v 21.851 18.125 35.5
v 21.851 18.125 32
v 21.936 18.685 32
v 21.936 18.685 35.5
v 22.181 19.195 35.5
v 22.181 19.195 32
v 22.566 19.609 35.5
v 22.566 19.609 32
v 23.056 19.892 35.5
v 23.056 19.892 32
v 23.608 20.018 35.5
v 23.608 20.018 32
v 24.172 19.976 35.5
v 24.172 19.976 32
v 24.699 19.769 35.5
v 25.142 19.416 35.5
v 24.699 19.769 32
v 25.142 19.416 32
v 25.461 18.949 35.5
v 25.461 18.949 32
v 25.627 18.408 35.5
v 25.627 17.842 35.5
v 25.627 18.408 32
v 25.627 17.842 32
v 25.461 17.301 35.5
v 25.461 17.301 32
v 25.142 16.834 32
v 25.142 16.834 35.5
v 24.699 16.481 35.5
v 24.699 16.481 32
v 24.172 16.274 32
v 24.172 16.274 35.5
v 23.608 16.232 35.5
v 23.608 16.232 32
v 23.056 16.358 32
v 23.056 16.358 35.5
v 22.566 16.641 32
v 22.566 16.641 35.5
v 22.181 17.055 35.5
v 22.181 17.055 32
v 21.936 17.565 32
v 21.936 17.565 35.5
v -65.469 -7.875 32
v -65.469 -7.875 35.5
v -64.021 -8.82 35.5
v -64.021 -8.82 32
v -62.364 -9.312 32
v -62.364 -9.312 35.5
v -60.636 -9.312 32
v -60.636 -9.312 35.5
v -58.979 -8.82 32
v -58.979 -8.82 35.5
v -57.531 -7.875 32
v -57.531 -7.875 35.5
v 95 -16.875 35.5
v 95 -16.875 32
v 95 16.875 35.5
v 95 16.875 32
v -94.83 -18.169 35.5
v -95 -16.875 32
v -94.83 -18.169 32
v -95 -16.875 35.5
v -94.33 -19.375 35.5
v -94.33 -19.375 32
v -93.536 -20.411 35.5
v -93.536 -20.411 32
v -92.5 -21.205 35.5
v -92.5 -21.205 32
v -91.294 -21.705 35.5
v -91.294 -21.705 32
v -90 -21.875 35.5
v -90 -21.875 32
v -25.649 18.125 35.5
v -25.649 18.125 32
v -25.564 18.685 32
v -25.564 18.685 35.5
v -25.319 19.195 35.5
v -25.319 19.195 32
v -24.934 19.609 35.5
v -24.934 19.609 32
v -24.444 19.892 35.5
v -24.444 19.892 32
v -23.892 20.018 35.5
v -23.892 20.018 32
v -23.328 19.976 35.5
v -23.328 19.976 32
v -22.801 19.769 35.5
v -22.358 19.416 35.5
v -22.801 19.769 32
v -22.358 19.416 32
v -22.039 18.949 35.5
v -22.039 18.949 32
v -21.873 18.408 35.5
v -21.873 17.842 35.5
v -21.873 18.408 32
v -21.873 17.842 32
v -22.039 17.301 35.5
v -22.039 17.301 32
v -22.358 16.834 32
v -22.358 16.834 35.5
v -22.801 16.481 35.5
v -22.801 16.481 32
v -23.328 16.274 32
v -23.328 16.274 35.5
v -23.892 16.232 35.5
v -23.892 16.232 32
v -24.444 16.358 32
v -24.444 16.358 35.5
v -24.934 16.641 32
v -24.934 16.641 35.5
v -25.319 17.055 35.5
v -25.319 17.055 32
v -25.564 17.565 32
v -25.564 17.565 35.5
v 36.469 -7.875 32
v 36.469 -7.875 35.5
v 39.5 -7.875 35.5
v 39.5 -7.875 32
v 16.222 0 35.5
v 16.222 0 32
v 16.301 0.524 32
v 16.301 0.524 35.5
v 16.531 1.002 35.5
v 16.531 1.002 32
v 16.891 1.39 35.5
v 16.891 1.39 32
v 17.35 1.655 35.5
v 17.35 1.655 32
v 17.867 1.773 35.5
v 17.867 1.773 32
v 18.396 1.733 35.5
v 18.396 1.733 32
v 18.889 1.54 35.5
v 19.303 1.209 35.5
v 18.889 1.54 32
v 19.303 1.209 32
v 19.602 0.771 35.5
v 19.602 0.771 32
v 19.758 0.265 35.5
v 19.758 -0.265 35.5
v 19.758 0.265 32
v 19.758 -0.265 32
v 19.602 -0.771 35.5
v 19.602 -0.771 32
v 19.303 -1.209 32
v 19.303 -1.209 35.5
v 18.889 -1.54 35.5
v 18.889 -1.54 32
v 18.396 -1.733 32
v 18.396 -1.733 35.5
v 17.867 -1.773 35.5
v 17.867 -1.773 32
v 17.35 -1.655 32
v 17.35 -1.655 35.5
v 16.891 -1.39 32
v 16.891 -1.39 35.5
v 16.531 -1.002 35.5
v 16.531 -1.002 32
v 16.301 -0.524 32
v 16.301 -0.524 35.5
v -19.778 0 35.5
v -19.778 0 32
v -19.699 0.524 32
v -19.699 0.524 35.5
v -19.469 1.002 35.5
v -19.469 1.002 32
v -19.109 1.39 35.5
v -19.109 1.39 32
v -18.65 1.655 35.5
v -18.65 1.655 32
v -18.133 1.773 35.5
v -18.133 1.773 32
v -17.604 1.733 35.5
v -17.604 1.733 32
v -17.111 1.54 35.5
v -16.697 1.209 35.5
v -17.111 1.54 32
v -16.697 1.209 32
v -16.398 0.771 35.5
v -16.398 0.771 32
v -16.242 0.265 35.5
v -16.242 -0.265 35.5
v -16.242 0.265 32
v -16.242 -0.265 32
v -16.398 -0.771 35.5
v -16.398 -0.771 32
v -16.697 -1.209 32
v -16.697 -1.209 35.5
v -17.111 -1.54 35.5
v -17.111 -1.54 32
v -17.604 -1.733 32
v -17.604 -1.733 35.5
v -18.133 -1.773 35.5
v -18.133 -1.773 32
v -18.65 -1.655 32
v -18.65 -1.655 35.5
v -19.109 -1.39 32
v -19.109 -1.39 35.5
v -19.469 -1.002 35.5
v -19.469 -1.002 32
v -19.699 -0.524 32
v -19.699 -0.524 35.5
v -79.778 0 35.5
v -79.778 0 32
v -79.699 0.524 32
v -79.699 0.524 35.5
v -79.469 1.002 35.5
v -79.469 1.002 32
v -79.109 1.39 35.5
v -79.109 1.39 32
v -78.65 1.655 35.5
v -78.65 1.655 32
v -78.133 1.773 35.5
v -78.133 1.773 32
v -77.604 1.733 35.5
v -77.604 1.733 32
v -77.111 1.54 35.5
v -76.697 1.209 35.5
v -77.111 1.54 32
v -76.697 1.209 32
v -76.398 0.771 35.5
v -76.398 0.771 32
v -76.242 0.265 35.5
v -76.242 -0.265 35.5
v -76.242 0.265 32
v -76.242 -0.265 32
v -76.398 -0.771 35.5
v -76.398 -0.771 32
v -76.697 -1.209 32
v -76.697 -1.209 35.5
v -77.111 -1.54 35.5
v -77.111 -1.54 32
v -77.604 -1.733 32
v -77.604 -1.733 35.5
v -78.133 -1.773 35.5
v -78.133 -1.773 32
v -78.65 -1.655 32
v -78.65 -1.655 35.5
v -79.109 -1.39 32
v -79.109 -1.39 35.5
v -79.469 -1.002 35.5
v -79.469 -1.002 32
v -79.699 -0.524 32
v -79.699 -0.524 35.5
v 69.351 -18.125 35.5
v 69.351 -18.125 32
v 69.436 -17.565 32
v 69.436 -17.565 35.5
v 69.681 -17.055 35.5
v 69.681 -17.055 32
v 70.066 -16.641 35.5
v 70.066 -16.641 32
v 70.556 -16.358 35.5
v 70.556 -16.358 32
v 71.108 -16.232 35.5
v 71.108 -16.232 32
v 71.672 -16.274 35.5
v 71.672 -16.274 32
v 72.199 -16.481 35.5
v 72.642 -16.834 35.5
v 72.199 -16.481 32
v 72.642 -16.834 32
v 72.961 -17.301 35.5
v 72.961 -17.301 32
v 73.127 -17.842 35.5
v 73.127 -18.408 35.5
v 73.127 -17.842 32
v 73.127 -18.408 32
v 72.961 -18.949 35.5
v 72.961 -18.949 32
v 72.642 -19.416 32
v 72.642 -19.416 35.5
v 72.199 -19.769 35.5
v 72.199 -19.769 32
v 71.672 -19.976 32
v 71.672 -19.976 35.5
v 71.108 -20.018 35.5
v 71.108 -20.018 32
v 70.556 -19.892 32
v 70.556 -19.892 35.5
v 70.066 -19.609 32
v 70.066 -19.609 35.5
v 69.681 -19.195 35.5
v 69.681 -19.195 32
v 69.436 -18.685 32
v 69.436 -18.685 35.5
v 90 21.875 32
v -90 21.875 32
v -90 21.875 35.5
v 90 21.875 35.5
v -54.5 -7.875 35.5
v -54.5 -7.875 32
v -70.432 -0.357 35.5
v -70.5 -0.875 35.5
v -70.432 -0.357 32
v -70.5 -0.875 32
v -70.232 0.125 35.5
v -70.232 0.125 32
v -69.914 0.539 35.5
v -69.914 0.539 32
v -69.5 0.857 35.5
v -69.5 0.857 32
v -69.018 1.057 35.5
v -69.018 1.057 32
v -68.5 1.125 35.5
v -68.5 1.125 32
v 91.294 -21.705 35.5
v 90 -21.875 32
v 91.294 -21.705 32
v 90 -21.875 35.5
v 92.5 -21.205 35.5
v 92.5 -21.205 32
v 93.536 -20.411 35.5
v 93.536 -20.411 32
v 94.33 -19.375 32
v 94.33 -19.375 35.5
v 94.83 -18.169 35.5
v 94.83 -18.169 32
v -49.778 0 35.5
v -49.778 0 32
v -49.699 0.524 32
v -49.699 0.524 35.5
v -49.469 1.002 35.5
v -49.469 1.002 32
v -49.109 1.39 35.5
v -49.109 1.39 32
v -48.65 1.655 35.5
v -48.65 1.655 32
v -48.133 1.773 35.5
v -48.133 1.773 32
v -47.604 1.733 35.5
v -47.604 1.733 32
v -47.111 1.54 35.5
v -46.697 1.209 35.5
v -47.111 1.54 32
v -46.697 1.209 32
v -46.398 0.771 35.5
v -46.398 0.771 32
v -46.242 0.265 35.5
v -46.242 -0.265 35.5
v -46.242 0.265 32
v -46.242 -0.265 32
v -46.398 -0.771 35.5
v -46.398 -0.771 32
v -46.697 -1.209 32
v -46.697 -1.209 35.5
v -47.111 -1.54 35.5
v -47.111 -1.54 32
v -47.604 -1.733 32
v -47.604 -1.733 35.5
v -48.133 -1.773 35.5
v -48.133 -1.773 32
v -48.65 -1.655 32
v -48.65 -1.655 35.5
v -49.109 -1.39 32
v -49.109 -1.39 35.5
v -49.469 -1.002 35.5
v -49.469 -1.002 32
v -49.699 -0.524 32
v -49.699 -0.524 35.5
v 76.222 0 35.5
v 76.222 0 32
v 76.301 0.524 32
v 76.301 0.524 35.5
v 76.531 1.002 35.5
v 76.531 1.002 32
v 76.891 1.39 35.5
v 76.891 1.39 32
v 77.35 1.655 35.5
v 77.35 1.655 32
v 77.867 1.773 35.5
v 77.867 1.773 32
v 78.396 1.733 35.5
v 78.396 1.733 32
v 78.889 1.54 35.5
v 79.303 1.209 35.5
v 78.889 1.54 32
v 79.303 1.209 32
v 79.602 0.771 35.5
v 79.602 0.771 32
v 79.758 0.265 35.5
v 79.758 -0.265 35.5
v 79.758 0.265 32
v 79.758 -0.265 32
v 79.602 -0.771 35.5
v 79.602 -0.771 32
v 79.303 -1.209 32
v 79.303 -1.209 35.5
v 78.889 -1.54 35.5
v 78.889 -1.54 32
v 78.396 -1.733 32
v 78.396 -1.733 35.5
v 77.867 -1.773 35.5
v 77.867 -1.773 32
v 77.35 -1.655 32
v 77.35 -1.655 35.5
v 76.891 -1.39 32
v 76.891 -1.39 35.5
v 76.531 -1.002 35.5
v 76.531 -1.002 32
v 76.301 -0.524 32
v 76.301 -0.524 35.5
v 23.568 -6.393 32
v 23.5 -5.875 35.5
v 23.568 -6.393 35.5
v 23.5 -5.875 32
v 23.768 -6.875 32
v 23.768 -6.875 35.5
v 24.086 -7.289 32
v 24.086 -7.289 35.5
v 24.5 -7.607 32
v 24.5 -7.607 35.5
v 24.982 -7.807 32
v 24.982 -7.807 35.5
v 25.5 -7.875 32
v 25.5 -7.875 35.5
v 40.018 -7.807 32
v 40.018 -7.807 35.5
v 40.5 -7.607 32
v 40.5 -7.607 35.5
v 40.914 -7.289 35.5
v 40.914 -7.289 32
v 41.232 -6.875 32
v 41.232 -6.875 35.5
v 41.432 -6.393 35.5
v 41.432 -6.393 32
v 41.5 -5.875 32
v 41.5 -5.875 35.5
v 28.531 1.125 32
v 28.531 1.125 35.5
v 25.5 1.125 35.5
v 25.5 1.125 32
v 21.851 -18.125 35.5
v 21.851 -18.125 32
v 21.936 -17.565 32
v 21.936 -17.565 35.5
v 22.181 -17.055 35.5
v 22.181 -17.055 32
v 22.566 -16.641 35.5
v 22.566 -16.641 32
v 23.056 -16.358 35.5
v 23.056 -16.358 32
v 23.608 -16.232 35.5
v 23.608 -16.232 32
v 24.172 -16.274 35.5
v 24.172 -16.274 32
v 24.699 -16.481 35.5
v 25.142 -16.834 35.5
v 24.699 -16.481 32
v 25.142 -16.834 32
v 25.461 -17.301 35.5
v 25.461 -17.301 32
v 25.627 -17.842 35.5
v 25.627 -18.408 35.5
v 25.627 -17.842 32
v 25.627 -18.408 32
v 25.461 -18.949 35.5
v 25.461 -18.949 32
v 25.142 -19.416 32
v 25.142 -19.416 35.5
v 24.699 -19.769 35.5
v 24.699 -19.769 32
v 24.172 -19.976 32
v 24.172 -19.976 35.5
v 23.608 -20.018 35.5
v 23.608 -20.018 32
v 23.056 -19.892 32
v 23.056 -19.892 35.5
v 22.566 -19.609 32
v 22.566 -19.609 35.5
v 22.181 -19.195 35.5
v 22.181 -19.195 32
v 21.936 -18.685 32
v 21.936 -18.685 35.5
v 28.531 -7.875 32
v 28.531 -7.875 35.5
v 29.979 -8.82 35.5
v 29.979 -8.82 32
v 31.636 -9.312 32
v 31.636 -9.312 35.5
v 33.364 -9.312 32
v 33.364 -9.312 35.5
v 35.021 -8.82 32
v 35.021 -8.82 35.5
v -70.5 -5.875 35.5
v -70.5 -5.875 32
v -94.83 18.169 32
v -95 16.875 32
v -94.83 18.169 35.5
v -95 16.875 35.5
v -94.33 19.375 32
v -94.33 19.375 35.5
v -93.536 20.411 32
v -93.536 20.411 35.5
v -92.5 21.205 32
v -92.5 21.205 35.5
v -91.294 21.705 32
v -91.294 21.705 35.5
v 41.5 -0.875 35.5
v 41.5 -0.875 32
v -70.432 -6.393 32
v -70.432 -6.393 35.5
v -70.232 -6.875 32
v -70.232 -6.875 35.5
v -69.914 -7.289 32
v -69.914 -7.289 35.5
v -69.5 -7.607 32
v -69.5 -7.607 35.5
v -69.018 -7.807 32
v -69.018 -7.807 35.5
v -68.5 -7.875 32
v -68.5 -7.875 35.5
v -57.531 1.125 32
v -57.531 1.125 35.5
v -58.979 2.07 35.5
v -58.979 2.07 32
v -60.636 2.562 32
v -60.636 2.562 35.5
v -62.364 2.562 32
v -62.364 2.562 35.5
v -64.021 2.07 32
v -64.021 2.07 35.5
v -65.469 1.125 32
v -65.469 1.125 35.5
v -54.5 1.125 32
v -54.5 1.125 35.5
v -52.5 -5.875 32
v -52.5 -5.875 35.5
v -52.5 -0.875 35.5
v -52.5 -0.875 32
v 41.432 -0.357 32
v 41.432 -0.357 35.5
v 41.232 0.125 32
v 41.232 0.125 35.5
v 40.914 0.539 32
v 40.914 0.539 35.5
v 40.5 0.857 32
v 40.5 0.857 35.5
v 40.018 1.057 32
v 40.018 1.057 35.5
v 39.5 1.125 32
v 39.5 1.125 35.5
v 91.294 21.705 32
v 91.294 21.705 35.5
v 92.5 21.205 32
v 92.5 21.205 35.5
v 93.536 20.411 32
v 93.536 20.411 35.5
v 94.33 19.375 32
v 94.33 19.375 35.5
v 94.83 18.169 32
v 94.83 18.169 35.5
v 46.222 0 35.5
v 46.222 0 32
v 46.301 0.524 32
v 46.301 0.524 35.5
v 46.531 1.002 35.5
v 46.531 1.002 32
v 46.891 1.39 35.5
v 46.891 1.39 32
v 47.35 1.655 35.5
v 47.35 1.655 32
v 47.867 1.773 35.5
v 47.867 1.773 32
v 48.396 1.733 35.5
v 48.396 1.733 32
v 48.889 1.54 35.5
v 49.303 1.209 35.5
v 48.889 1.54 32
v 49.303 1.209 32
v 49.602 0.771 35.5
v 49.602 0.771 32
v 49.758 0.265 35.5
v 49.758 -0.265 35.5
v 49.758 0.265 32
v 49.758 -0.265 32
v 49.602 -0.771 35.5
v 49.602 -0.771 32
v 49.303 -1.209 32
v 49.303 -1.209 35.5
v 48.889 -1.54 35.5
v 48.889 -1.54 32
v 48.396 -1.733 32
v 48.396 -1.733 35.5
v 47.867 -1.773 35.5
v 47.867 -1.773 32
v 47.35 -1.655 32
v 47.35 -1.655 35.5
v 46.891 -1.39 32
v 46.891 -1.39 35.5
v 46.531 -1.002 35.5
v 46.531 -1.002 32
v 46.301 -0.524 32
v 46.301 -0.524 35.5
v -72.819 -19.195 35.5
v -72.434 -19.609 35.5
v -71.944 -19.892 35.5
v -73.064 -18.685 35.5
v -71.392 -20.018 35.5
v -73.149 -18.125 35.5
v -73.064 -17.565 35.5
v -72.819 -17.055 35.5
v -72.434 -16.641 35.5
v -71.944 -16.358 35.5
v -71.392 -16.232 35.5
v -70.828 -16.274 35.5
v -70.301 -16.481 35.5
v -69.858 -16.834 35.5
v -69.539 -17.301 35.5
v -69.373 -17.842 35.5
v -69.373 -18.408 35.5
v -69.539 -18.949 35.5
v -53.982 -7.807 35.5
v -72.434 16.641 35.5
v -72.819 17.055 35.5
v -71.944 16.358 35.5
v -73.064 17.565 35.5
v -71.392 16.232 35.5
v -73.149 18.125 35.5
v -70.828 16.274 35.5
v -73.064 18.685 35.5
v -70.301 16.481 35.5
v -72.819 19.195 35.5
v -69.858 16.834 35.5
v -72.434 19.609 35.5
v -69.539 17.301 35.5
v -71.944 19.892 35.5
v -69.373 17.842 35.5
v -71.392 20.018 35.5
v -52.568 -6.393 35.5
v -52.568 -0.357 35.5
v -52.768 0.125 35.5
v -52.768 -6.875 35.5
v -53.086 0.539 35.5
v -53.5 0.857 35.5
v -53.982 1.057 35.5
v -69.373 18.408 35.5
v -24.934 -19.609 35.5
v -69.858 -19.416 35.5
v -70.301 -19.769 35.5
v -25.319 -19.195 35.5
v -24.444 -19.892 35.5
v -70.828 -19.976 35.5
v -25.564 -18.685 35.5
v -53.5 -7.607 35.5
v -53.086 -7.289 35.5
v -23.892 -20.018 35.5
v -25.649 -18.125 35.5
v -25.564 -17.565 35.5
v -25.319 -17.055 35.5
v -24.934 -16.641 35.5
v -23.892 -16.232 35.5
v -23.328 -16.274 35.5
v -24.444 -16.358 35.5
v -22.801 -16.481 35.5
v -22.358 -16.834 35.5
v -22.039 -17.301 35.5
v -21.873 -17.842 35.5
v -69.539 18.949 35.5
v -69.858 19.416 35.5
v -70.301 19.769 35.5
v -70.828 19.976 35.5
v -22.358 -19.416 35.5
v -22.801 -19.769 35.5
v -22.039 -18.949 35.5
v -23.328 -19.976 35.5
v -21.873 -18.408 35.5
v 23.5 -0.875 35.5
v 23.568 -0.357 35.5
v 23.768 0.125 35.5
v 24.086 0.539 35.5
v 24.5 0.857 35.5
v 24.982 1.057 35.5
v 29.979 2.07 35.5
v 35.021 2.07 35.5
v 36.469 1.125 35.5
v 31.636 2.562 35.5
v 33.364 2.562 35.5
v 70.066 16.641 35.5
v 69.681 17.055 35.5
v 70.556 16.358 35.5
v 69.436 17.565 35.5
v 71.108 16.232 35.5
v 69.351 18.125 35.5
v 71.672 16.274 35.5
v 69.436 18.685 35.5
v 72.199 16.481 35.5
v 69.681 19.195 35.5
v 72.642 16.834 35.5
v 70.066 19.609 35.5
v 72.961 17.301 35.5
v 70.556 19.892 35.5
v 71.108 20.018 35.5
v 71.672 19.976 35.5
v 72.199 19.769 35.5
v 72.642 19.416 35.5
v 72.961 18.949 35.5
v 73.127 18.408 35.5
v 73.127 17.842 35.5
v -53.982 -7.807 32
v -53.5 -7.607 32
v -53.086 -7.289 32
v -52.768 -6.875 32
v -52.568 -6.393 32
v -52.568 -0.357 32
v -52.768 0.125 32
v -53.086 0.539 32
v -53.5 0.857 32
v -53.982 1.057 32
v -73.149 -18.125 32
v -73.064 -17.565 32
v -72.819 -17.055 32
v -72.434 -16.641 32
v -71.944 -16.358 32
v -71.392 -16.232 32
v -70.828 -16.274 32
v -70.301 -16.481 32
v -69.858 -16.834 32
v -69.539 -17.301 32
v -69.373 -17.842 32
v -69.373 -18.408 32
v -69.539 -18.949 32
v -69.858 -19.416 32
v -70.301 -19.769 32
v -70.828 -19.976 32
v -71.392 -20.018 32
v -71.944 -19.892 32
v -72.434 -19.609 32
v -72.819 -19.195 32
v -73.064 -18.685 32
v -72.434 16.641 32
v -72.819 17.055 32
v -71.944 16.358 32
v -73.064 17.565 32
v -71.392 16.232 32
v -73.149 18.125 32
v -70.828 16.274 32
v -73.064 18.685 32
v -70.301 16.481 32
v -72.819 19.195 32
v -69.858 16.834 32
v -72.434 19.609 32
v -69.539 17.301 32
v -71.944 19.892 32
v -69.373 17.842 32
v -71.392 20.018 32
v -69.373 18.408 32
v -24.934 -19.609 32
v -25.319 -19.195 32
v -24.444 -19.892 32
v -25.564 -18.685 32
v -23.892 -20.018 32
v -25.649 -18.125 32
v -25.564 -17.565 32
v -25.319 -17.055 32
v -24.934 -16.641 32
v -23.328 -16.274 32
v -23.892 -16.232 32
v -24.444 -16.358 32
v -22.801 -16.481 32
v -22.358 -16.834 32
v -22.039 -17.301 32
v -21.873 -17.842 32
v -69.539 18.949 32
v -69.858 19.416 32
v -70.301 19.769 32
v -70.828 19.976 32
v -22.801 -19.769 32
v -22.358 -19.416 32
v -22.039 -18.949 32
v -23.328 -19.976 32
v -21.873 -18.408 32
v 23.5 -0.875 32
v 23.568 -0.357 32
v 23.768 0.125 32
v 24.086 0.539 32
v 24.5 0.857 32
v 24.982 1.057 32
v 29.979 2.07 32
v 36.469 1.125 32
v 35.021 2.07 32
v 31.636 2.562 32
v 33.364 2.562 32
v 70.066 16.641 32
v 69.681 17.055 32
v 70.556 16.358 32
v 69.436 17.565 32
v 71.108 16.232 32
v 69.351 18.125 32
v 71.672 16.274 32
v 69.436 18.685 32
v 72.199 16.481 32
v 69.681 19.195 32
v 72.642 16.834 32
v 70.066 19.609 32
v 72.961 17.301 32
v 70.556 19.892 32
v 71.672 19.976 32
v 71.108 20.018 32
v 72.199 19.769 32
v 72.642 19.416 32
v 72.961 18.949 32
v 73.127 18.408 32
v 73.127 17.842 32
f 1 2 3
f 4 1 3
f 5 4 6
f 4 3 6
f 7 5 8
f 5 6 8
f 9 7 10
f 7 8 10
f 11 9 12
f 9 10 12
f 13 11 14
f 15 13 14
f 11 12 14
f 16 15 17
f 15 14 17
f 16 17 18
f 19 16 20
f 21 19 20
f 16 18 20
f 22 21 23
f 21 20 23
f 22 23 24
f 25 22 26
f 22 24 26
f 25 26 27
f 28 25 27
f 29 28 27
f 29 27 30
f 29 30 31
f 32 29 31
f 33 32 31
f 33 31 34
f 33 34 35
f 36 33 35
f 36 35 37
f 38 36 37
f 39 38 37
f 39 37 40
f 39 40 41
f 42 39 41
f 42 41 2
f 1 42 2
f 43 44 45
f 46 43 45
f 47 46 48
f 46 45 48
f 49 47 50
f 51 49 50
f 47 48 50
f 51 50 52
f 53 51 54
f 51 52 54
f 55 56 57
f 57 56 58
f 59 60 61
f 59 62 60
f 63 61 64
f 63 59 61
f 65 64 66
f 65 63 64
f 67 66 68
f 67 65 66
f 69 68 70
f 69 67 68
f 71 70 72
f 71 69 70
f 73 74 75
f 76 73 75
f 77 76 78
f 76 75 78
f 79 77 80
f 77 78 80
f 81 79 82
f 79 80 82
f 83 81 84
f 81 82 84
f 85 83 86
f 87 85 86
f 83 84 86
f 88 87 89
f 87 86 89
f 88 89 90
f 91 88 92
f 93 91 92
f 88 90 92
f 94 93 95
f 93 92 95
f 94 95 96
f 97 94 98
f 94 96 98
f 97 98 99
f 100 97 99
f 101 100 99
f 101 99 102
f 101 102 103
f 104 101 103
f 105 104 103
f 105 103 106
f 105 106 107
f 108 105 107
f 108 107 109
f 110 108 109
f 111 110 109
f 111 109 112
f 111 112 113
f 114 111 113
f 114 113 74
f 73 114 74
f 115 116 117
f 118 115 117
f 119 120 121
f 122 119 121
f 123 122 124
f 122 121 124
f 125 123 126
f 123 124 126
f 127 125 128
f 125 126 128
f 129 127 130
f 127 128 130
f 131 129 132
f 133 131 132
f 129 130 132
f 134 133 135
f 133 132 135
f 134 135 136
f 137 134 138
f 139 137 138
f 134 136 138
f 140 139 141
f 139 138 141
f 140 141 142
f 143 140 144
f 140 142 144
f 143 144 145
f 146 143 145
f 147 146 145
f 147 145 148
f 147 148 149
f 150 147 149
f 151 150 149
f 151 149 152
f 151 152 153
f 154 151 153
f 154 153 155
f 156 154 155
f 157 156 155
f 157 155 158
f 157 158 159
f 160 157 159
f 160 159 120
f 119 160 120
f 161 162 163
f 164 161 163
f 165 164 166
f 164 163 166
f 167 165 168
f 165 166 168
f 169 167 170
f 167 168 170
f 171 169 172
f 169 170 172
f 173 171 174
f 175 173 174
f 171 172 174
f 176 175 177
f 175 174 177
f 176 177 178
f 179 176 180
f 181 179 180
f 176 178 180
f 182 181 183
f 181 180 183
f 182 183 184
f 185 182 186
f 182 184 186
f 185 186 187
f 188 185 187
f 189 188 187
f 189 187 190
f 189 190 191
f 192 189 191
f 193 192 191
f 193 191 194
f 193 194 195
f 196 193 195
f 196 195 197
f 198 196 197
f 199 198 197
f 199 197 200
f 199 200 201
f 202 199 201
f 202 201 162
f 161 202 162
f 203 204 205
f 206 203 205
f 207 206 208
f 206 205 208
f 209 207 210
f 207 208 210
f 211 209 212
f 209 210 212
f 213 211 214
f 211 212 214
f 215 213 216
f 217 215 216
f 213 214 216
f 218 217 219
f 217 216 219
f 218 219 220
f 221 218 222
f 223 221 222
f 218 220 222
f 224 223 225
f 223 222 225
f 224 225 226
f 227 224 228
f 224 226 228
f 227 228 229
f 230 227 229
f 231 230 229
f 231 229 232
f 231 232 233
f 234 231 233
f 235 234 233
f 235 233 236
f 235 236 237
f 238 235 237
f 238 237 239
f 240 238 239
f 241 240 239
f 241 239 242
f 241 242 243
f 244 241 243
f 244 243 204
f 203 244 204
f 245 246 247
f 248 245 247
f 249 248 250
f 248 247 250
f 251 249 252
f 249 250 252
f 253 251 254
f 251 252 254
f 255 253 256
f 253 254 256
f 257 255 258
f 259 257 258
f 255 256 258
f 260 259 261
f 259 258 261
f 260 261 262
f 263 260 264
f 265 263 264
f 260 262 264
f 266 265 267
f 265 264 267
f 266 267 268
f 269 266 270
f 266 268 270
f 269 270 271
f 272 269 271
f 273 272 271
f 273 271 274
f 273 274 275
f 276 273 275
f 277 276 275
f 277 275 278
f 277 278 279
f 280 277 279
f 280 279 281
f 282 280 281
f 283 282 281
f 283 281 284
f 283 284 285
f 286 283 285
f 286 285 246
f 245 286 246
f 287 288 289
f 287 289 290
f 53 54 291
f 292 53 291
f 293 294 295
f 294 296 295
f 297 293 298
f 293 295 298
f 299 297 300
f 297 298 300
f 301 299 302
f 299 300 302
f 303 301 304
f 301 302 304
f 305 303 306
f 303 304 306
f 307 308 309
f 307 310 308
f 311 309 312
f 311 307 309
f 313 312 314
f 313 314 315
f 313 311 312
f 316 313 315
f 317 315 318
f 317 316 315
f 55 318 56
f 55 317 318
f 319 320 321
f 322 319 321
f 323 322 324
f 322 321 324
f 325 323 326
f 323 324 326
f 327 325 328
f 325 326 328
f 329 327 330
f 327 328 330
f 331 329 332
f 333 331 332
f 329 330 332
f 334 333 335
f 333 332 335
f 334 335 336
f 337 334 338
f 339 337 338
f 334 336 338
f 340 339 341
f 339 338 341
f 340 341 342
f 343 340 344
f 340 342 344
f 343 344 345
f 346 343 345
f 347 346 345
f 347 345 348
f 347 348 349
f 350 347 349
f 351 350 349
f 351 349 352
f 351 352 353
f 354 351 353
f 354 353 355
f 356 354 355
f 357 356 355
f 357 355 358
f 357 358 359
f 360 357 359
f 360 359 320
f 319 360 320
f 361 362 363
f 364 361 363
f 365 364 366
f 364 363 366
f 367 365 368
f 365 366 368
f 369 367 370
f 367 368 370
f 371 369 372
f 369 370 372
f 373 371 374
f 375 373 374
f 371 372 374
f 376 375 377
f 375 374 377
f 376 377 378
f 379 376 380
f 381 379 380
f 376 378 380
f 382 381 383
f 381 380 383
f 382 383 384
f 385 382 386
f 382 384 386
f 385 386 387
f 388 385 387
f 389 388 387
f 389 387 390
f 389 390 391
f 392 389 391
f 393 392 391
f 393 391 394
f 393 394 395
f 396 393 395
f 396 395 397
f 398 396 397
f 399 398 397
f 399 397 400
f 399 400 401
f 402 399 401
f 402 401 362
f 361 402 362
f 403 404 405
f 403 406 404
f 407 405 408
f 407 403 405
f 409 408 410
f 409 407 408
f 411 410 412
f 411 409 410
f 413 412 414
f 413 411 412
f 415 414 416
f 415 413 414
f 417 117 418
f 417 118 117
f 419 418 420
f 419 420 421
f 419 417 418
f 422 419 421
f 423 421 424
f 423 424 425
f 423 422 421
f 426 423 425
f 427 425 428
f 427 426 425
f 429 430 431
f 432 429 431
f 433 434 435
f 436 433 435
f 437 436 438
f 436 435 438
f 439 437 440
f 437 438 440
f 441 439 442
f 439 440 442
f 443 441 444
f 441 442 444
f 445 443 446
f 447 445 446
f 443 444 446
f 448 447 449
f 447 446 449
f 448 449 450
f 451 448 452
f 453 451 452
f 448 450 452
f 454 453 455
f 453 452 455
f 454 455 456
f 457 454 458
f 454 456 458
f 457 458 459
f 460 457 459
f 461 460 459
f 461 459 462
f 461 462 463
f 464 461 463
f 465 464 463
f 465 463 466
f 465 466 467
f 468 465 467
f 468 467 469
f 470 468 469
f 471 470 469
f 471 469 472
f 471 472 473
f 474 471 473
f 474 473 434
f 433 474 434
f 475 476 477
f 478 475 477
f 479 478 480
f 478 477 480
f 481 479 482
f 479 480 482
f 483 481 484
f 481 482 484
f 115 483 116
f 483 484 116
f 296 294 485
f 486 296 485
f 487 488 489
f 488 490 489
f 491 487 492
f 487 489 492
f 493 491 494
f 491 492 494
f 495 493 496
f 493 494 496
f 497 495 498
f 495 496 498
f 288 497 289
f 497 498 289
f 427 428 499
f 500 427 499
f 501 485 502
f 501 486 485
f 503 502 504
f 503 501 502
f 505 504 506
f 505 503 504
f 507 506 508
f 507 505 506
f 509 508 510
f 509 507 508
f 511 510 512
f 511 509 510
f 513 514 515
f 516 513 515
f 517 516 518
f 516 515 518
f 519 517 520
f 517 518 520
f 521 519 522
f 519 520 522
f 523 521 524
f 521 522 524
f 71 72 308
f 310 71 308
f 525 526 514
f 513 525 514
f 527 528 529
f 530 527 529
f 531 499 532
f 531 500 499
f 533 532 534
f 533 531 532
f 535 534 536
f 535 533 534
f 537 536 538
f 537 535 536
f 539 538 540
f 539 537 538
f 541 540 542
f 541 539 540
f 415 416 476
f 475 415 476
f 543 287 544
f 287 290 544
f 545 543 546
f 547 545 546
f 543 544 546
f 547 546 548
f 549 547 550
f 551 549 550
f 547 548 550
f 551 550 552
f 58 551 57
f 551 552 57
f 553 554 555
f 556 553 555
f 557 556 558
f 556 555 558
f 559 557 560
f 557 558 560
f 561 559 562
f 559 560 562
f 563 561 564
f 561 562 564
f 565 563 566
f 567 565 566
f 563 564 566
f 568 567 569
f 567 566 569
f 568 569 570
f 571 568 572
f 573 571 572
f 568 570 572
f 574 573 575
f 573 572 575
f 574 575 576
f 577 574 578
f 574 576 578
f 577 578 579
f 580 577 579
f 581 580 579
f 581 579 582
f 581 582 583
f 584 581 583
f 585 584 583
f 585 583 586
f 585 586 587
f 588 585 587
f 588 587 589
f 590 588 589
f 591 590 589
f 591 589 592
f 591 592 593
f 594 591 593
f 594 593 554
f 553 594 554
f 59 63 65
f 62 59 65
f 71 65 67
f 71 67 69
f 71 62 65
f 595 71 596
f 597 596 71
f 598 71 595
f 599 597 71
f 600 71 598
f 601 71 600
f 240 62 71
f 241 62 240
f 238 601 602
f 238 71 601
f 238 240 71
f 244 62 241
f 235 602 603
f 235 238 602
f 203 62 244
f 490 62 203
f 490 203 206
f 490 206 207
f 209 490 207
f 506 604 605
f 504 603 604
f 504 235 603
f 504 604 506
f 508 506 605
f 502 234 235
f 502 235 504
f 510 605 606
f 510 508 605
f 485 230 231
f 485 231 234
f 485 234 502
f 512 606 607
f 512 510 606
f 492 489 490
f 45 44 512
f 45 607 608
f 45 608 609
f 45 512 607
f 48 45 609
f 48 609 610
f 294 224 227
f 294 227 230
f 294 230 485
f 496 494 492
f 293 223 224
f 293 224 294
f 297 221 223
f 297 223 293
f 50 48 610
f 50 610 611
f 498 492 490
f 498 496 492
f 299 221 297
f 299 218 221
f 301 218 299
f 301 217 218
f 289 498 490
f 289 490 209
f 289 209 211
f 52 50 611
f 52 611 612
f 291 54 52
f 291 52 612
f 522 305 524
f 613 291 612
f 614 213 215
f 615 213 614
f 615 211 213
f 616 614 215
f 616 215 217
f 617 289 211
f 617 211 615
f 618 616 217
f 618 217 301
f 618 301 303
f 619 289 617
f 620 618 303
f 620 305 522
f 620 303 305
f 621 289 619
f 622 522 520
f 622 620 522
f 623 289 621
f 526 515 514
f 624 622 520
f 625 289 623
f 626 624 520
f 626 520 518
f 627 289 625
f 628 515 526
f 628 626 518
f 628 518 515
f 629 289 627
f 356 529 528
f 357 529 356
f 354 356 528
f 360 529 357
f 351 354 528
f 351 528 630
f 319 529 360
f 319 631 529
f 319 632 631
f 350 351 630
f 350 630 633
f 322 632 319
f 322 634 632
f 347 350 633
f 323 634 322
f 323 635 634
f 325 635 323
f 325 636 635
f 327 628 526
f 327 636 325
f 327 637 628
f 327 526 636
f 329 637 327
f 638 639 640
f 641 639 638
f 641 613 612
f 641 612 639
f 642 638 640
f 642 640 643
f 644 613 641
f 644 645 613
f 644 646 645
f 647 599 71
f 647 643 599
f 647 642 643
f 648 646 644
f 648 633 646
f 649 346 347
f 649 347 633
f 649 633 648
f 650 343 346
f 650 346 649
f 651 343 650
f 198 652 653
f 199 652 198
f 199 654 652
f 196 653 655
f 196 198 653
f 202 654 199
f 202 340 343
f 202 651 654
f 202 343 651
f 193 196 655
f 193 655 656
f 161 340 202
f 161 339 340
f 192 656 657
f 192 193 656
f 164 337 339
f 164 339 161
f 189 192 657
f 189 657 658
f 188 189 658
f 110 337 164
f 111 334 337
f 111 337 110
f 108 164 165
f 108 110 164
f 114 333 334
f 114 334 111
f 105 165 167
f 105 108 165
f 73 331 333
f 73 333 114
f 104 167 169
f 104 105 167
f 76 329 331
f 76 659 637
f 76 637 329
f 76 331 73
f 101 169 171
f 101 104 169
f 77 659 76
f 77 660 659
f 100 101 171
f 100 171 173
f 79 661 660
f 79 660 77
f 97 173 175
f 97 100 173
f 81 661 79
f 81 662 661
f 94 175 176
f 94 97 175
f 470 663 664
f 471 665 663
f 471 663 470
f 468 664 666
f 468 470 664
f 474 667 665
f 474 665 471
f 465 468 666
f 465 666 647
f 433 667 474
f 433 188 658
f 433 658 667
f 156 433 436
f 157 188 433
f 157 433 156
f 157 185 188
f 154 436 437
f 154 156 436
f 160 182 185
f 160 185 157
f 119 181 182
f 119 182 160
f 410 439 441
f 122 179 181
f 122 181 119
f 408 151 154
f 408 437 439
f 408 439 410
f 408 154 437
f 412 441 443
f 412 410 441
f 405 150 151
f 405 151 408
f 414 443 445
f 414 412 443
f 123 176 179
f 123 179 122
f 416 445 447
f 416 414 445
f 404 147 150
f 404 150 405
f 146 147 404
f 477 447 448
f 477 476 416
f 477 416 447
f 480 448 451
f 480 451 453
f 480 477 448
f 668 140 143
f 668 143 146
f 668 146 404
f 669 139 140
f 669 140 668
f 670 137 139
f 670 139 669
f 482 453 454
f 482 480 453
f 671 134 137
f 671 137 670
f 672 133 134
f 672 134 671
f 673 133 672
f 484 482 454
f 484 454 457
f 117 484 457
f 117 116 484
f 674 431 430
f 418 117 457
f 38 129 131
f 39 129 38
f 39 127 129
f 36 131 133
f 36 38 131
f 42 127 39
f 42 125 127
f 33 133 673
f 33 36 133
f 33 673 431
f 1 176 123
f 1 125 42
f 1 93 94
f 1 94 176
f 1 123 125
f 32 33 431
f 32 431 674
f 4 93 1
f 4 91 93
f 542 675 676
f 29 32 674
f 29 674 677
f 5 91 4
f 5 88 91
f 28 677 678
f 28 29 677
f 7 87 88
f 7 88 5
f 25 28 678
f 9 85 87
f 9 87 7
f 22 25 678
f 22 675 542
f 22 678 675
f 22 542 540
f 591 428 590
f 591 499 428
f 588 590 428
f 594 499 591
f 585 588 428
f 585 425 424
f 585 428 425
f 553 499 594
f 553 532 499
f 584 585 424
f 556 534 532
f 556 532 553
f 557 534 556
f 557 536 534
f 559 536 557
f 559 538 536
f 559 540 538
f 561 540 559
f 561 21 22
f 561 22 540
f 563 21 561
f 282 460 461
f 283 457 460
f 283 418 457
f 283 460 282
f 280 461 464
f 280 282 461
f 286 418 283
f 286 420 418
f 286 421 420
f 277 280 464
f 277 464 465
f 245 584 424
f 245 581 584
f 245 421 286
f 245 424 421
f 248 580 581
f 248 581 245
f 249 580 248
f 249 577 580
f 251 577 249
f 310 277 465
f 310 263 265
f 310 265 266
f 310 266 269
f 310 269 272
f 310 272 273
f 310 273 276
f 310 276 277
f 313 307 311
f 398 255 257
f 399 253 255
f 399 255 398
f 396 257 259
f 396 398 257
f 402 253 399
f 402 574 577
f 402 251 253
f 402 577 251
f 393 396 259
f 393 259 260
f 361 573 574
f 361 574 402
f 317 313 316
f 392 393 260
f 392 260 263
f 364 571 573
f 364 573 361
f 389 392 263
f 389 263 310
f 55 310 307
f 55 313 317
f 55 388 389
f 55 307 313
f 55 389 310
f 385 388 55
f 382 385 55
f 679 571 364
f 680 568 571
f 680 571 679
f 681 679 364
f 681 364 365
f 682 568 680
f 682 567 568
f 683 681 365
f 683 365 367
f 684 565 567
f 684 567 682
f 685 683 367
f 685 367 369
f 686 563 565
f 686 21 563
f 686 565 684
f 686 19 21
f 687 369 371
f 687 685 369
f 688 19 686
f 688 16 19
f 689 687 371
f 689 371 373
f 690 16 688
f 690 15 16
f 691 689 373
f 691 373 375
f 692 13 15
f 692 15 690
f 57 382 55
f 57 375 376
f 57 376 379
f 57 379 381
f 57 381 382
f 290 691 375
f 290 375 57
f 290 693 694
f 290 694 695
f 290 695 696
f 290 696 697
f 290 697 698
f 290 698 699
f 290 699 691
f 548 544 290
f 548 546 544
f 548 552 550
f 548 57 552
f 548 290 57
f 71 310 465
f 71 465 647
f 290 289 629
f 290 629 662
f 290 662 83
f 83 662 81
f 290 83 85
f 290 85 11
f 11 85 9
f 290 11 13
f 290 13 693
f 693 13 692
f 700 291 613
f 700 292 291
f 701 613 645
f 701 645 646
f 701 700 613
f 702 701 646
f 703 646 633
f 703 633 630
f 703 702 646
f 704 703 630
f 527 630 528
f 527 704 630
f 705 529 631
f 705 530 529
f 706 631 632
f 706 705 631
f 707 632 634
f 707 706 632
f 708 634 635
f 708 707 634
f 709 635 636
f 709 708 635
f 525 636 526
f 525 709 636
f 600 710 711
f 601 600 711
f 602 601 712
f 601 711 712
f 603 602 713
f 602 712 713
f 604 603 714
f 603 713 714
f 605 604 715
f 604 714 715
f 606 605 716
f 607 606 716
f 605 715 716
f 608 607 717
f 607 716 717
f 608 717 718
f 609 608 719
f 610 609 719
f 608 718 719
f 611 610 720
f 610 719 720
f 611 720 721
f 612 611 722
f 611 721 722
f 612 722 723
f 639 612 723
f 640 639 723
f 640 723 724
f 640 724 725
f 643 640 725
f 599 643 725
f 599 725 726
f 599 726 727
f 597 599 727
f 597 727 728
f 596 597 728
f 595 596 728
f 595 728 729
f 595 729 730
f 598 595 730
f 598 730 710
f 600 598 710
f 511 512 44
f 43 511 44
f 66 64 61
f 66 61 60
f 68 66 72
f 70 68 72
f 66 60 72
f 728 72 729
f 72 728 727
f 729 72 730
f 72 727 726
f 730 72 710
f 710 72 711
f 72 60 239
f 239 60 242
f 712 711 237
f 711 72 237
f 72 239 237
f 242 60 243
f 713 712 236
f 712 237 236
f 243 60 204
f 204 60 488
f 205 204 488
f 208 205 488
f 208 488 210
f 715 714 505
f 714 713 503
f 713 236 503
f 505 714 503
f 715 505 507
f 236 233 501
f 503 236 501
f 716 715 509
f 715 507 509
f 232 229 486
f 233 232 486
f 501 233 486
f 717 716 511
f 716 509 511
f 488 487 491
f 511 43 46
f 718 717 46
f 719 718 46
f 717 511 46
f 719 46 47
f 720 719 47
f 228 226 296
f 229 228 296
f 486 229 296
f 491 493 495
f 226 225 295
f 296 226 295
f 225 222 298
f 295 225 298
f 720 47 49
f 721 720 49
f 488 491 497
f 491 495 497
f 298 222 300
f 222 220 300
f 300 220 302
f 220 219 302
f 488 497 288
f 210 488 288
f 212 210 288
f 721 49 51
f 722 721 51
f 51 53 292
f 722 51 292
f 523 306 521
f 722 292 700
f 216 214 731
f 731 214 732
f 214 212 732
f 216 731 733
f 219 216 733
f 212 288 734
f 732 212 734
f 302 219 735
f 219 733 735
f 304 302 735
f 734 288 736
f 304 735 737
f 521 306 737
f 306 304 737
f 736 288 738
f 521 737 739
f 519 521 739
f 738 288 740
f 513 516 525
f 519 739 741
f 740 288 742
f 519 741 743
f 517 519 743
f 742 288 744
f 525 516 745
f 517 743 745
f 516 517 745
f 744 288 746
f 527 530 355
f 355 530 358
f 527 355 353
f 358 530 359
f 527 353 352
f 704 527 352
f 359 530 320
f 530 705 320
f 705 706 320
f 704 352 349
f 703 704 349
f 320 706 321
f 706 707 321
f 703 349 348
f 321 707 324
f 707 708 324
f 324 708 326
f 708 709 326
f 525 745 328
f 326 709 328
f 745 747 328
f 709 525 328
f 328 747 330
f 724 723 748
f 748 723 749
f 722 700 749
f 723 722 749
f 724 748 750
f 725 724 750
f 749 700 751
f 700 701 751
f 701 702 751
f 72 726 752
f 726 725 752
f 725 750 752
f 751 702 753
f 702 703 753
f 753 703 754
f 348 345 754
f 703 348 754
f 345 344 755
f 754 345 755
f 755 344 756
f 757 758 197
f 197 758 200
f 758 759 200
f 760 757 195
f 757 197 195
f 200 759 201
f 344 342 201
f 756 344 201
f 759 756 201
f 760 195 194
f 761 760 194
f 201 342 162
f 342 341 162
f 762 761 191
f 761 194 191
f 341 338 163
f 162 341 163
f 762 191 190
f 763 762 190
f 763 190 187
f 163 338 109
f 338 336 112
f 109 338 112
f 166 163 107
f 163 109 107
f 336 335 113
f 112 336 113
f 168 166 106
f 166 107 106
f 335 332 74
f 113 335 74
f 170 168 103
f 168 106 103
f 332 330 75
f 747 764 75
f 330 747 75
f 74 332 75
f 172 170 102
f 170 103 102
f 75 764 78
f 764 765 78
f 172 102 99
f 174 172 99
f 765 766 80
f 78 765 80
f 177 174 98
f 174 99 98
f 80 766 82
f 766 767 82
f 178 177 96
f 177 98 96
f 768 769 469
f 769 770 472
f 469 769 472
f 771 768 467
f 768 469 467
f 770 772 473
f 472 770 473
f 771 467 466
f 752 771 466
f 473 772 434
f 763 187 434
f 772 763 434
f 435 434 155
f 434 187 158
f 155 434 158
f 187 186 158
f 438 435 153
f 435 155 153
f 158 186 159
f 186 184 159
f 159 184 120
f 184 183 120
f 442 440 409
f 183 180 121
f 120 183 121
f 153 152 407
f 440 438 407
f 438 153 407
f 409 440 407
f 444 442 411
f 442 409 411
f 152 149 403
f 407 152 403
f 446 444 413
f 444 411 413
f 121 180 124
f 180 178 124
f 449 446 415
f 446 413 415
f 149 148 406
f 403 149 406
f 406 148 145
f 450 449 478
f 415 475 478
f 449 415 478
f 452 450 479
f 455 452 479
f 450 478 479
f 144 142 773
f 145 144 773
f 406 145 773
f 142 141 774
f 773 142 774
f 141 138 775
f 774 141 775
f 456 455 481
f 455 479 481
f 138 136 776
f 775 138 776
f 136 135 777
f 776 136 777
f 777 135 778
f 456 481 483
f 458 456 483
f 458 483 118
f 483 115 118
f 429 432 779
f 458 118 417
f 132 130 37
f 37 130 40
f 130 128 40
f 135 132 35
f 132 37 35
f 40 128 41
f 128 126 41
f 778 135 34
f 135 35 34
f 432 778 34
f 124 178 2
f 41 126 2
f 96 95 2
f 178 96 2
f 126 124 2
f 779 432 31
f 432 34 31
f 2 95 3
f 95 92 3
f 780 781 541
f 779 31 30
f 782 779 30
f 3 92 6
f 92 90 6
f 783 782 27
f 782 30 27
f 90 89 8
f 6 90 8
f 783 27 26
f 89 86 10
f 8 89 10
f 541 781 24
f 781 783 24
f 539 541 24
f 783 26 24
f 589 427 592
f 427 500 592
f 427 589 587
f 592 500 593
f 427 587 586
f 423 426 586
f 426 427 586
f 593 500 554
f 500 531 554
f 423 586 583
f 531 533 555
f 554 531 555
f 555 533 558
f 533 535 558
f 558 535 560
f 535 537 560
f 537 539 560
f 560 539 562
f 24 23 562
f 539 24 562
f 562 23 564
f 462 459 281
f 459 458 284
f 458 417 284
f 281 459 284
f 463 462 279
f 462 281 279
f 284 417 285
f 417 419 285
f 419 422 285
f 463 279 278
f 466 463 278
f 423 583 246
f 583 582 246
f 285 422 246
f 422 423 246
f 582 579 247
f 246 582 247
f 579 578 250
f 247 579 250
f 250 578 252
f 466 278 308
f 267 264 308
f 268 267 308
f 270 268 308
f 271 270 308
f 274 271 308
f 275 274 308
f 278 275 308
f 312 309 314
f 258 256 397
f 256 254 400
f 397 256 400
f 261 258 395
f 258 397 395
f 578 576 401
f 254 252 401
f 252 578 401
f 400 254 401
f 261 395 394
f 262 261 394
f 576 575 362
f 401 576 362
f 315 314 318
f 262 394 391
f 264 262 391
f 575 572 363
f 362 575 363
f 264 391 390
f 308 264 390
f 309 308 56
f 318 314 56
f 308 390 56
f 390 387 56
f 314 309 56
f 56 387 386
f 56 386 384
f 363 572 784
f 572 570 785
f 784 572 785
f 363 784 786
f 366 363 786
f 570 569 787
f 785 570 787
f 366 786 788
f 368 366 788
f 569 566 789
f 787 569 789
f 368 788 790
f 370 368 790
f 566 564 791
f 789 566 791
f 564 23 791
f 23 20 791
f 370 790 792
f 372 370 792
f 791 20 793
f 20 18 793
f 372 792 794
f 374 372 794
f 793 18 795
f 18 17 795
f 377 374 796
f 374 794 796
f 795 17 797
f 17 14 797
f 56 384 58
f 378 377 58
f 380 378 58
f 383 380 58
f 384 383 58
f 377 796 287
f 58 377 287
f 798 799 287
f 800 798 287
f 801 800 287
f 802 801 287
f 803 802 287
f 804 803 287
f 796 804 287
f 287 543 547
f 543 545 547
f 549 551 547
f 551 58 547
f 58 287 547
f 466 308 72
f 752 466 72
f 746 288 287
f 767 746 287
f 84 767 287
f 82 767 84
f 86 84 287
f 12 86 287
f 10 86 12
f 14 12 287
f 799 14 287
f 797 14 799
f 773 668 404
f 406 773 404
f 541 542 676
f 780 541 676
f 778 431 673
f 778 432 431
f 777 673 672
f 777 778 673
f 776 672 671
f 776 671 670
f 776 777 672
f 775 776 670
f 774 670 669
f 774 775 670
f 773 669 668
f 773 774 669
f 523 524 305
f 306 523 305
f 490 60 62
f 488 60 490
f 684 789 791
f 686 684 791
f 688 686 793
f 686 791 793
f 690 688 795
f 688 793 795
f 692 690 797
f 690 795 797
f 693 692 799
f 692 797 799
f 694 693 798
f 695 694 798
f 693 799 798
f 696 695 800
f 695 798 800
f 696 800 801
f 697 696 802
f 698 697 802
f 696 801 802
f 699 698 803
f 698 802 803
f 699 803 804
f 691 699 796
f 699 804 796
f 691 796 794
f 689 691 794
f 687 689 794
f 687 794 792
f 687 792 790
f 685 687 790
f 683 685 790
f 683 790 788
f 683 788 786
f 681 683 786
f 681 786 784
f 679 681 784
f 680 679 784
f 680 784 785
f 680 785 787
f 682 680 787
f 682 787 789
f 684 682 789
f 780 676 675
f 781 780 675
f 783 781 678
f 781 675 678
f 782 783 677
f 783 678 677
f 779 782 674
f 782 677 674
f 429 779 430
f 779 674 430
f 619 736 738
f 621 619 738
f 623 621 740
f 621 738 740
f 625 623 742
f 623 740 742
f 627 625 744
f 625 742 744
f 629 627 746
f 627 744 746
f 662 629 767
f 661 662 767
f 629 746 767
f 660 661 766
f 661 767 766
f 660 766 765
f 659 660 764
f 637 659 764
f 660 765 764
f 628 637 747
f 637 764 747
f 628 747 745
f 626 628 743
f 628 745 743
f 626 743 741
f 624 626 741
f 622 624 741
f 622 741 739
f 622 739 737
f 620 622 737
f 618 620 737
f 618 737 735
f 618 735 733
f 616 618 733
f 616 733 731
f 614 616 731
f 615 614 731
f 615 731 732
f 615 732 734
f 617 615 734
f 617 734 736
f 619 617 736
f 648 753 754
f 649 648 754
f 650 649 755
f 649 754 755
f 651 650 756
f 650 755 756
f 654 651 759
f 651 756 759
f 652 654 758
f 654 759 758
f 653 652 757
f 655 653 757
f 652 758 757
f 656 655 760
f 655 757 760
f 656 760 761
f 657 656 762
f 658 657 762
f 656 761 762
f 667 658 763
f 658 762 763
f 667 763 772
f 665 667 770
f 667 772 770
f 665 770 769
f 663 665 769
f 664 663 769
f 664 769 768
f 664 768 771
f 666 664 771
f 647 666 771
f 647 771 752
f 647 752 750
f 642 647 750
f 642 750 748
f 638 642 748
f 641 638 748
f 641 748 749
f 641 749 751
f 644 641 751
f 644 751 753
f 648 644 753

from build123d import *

# Parameters (mm, degrees)
SKETCH1_W             = 190
SKETCH1_H             = 43.75
BOSS_EXTRUDE1_DEPTH   = 3.5
F_6_CLEARANCE_HOLE1_D = 3.7973
CUT_EXTRUDE1_DEPTH    = 98.548785871
FILLET1_R             = 2
FILLET2_R             = 5
F_6_CLEARANCE_HOLE2_D = 3.556


with BuildPart() as part:
    # Sketch1 → Boss-Extrude1 (new body)
    with BuildSketch(Plane.XY.offset(32)):
        Rectangle(SKETCH1_W, SKETCH1_H)
    extrude(amount=BOSS_EXTRUDE1_DEPTH)

    # #6 Clearance Hole1 (through all)
    with Locations(Plane.XY.offset(35.5)):
        with Locations((71.25, 18.125), (23.75, 18.125), (-23.75, 18.125), (-71.25, 18.125), (-71.25, -18.125), (-23.75, -18.125), (23.75, -18.125), (71.25, -18.125)):
            Hole(F_6_CLEARANCE_HOLE1_D / 2)

    # Sketch6 → Cut-Extrude1 (cut, through all)
    with BuildSketch(Plane.XY.offset(35.5)):
        with BuildLine():
            Line((36.468626967, -7.875), (41.5, -7.875))
            Line((41.5, -7.875), (41.5, 1.125))
            Line((41.5, 1.125), (36.468626967, 1.125))
            ThreePointArc((36.468626967, 1.125), (32.5, 2.625), (28.531373033, 1.125))
            Line((28.531373033, 1.125), (23.5, 1.125))
            Line((23.5, 1.125), (23.5, -7.875))
            Line((23.5, -7.875), (28.531373033, -7.875))
            ThreePointArc((28.531373033, -7.875), (32.5, -9.375), (36.468626967, -7.875))
        make_face()
        with BuildLine():
            Line((-70.5, 1.125), (-70.5, -7.875))
            Line((-70.5, -7.875), (-65.468626967, -7.875))
            ThreePointArc((-65.468626967, -7.875), (-61.5, -9.375), (-57.531373033, -7.875))
            Line((-57.531373033, -7.875), (-52.5, -7.875))
            Line((-52.5, -7.875), (-52.5, 1.125))
            Line((-52.5, 1.125), (-57.531373033, 1.125))
            ThreePointArc((-57.531373033, 1.125), (-61.5, 2.625), (-65.468626967, 1.125))
            Line((-65.468626967, 1.125), (-70.5, 1.125))
        make_face()
    extrude(amount=-CUT_EXTRUDE1_DEPTH, mode=Mode.SUBTRACT)

    # Fillet1
    fillet1_edges = [part.edges().sort_by_distance(p)[0] for p in [
        (41.5, 1.125, 33.75),
        (41.5, -7.875, 33.75),
        (23.5, -7.875, 33.75),
        (23.5, 1.125, 33.75),
        (-52.5, 1.125, 33.75),
        (-52.5, -7.875, 33.75),
        (-70.5, -7.875, 33.75),
        (-70.5, 1.125, 33.75),
    ]]
    fillet(fillet1_edges, radius=FILLET1_R)

    # Fillet2
    fillet2_edges = [part.edges().sort_by_distance(p)[0] for p in [
        (95, -21.875, 33.75),
        (-95, -21.875, 33.75),
        (-95, 21.875, 33.75),
        (95, 21.875, 33.75),
    ]]
    fillet(fillet2_edges, radius=FILLET2_R)

    # #6 Clearance Hole2 (through all)
    with Locations(Plane.XY.offset(35.5)):
        with Locations((78, 0), (48, 0), (18, 0), (-18, 0), (-48, 0), (-78, 0)):
            Hole(F_6_CLEARANCE_HOLE2_D / 2)


solid = part.part
